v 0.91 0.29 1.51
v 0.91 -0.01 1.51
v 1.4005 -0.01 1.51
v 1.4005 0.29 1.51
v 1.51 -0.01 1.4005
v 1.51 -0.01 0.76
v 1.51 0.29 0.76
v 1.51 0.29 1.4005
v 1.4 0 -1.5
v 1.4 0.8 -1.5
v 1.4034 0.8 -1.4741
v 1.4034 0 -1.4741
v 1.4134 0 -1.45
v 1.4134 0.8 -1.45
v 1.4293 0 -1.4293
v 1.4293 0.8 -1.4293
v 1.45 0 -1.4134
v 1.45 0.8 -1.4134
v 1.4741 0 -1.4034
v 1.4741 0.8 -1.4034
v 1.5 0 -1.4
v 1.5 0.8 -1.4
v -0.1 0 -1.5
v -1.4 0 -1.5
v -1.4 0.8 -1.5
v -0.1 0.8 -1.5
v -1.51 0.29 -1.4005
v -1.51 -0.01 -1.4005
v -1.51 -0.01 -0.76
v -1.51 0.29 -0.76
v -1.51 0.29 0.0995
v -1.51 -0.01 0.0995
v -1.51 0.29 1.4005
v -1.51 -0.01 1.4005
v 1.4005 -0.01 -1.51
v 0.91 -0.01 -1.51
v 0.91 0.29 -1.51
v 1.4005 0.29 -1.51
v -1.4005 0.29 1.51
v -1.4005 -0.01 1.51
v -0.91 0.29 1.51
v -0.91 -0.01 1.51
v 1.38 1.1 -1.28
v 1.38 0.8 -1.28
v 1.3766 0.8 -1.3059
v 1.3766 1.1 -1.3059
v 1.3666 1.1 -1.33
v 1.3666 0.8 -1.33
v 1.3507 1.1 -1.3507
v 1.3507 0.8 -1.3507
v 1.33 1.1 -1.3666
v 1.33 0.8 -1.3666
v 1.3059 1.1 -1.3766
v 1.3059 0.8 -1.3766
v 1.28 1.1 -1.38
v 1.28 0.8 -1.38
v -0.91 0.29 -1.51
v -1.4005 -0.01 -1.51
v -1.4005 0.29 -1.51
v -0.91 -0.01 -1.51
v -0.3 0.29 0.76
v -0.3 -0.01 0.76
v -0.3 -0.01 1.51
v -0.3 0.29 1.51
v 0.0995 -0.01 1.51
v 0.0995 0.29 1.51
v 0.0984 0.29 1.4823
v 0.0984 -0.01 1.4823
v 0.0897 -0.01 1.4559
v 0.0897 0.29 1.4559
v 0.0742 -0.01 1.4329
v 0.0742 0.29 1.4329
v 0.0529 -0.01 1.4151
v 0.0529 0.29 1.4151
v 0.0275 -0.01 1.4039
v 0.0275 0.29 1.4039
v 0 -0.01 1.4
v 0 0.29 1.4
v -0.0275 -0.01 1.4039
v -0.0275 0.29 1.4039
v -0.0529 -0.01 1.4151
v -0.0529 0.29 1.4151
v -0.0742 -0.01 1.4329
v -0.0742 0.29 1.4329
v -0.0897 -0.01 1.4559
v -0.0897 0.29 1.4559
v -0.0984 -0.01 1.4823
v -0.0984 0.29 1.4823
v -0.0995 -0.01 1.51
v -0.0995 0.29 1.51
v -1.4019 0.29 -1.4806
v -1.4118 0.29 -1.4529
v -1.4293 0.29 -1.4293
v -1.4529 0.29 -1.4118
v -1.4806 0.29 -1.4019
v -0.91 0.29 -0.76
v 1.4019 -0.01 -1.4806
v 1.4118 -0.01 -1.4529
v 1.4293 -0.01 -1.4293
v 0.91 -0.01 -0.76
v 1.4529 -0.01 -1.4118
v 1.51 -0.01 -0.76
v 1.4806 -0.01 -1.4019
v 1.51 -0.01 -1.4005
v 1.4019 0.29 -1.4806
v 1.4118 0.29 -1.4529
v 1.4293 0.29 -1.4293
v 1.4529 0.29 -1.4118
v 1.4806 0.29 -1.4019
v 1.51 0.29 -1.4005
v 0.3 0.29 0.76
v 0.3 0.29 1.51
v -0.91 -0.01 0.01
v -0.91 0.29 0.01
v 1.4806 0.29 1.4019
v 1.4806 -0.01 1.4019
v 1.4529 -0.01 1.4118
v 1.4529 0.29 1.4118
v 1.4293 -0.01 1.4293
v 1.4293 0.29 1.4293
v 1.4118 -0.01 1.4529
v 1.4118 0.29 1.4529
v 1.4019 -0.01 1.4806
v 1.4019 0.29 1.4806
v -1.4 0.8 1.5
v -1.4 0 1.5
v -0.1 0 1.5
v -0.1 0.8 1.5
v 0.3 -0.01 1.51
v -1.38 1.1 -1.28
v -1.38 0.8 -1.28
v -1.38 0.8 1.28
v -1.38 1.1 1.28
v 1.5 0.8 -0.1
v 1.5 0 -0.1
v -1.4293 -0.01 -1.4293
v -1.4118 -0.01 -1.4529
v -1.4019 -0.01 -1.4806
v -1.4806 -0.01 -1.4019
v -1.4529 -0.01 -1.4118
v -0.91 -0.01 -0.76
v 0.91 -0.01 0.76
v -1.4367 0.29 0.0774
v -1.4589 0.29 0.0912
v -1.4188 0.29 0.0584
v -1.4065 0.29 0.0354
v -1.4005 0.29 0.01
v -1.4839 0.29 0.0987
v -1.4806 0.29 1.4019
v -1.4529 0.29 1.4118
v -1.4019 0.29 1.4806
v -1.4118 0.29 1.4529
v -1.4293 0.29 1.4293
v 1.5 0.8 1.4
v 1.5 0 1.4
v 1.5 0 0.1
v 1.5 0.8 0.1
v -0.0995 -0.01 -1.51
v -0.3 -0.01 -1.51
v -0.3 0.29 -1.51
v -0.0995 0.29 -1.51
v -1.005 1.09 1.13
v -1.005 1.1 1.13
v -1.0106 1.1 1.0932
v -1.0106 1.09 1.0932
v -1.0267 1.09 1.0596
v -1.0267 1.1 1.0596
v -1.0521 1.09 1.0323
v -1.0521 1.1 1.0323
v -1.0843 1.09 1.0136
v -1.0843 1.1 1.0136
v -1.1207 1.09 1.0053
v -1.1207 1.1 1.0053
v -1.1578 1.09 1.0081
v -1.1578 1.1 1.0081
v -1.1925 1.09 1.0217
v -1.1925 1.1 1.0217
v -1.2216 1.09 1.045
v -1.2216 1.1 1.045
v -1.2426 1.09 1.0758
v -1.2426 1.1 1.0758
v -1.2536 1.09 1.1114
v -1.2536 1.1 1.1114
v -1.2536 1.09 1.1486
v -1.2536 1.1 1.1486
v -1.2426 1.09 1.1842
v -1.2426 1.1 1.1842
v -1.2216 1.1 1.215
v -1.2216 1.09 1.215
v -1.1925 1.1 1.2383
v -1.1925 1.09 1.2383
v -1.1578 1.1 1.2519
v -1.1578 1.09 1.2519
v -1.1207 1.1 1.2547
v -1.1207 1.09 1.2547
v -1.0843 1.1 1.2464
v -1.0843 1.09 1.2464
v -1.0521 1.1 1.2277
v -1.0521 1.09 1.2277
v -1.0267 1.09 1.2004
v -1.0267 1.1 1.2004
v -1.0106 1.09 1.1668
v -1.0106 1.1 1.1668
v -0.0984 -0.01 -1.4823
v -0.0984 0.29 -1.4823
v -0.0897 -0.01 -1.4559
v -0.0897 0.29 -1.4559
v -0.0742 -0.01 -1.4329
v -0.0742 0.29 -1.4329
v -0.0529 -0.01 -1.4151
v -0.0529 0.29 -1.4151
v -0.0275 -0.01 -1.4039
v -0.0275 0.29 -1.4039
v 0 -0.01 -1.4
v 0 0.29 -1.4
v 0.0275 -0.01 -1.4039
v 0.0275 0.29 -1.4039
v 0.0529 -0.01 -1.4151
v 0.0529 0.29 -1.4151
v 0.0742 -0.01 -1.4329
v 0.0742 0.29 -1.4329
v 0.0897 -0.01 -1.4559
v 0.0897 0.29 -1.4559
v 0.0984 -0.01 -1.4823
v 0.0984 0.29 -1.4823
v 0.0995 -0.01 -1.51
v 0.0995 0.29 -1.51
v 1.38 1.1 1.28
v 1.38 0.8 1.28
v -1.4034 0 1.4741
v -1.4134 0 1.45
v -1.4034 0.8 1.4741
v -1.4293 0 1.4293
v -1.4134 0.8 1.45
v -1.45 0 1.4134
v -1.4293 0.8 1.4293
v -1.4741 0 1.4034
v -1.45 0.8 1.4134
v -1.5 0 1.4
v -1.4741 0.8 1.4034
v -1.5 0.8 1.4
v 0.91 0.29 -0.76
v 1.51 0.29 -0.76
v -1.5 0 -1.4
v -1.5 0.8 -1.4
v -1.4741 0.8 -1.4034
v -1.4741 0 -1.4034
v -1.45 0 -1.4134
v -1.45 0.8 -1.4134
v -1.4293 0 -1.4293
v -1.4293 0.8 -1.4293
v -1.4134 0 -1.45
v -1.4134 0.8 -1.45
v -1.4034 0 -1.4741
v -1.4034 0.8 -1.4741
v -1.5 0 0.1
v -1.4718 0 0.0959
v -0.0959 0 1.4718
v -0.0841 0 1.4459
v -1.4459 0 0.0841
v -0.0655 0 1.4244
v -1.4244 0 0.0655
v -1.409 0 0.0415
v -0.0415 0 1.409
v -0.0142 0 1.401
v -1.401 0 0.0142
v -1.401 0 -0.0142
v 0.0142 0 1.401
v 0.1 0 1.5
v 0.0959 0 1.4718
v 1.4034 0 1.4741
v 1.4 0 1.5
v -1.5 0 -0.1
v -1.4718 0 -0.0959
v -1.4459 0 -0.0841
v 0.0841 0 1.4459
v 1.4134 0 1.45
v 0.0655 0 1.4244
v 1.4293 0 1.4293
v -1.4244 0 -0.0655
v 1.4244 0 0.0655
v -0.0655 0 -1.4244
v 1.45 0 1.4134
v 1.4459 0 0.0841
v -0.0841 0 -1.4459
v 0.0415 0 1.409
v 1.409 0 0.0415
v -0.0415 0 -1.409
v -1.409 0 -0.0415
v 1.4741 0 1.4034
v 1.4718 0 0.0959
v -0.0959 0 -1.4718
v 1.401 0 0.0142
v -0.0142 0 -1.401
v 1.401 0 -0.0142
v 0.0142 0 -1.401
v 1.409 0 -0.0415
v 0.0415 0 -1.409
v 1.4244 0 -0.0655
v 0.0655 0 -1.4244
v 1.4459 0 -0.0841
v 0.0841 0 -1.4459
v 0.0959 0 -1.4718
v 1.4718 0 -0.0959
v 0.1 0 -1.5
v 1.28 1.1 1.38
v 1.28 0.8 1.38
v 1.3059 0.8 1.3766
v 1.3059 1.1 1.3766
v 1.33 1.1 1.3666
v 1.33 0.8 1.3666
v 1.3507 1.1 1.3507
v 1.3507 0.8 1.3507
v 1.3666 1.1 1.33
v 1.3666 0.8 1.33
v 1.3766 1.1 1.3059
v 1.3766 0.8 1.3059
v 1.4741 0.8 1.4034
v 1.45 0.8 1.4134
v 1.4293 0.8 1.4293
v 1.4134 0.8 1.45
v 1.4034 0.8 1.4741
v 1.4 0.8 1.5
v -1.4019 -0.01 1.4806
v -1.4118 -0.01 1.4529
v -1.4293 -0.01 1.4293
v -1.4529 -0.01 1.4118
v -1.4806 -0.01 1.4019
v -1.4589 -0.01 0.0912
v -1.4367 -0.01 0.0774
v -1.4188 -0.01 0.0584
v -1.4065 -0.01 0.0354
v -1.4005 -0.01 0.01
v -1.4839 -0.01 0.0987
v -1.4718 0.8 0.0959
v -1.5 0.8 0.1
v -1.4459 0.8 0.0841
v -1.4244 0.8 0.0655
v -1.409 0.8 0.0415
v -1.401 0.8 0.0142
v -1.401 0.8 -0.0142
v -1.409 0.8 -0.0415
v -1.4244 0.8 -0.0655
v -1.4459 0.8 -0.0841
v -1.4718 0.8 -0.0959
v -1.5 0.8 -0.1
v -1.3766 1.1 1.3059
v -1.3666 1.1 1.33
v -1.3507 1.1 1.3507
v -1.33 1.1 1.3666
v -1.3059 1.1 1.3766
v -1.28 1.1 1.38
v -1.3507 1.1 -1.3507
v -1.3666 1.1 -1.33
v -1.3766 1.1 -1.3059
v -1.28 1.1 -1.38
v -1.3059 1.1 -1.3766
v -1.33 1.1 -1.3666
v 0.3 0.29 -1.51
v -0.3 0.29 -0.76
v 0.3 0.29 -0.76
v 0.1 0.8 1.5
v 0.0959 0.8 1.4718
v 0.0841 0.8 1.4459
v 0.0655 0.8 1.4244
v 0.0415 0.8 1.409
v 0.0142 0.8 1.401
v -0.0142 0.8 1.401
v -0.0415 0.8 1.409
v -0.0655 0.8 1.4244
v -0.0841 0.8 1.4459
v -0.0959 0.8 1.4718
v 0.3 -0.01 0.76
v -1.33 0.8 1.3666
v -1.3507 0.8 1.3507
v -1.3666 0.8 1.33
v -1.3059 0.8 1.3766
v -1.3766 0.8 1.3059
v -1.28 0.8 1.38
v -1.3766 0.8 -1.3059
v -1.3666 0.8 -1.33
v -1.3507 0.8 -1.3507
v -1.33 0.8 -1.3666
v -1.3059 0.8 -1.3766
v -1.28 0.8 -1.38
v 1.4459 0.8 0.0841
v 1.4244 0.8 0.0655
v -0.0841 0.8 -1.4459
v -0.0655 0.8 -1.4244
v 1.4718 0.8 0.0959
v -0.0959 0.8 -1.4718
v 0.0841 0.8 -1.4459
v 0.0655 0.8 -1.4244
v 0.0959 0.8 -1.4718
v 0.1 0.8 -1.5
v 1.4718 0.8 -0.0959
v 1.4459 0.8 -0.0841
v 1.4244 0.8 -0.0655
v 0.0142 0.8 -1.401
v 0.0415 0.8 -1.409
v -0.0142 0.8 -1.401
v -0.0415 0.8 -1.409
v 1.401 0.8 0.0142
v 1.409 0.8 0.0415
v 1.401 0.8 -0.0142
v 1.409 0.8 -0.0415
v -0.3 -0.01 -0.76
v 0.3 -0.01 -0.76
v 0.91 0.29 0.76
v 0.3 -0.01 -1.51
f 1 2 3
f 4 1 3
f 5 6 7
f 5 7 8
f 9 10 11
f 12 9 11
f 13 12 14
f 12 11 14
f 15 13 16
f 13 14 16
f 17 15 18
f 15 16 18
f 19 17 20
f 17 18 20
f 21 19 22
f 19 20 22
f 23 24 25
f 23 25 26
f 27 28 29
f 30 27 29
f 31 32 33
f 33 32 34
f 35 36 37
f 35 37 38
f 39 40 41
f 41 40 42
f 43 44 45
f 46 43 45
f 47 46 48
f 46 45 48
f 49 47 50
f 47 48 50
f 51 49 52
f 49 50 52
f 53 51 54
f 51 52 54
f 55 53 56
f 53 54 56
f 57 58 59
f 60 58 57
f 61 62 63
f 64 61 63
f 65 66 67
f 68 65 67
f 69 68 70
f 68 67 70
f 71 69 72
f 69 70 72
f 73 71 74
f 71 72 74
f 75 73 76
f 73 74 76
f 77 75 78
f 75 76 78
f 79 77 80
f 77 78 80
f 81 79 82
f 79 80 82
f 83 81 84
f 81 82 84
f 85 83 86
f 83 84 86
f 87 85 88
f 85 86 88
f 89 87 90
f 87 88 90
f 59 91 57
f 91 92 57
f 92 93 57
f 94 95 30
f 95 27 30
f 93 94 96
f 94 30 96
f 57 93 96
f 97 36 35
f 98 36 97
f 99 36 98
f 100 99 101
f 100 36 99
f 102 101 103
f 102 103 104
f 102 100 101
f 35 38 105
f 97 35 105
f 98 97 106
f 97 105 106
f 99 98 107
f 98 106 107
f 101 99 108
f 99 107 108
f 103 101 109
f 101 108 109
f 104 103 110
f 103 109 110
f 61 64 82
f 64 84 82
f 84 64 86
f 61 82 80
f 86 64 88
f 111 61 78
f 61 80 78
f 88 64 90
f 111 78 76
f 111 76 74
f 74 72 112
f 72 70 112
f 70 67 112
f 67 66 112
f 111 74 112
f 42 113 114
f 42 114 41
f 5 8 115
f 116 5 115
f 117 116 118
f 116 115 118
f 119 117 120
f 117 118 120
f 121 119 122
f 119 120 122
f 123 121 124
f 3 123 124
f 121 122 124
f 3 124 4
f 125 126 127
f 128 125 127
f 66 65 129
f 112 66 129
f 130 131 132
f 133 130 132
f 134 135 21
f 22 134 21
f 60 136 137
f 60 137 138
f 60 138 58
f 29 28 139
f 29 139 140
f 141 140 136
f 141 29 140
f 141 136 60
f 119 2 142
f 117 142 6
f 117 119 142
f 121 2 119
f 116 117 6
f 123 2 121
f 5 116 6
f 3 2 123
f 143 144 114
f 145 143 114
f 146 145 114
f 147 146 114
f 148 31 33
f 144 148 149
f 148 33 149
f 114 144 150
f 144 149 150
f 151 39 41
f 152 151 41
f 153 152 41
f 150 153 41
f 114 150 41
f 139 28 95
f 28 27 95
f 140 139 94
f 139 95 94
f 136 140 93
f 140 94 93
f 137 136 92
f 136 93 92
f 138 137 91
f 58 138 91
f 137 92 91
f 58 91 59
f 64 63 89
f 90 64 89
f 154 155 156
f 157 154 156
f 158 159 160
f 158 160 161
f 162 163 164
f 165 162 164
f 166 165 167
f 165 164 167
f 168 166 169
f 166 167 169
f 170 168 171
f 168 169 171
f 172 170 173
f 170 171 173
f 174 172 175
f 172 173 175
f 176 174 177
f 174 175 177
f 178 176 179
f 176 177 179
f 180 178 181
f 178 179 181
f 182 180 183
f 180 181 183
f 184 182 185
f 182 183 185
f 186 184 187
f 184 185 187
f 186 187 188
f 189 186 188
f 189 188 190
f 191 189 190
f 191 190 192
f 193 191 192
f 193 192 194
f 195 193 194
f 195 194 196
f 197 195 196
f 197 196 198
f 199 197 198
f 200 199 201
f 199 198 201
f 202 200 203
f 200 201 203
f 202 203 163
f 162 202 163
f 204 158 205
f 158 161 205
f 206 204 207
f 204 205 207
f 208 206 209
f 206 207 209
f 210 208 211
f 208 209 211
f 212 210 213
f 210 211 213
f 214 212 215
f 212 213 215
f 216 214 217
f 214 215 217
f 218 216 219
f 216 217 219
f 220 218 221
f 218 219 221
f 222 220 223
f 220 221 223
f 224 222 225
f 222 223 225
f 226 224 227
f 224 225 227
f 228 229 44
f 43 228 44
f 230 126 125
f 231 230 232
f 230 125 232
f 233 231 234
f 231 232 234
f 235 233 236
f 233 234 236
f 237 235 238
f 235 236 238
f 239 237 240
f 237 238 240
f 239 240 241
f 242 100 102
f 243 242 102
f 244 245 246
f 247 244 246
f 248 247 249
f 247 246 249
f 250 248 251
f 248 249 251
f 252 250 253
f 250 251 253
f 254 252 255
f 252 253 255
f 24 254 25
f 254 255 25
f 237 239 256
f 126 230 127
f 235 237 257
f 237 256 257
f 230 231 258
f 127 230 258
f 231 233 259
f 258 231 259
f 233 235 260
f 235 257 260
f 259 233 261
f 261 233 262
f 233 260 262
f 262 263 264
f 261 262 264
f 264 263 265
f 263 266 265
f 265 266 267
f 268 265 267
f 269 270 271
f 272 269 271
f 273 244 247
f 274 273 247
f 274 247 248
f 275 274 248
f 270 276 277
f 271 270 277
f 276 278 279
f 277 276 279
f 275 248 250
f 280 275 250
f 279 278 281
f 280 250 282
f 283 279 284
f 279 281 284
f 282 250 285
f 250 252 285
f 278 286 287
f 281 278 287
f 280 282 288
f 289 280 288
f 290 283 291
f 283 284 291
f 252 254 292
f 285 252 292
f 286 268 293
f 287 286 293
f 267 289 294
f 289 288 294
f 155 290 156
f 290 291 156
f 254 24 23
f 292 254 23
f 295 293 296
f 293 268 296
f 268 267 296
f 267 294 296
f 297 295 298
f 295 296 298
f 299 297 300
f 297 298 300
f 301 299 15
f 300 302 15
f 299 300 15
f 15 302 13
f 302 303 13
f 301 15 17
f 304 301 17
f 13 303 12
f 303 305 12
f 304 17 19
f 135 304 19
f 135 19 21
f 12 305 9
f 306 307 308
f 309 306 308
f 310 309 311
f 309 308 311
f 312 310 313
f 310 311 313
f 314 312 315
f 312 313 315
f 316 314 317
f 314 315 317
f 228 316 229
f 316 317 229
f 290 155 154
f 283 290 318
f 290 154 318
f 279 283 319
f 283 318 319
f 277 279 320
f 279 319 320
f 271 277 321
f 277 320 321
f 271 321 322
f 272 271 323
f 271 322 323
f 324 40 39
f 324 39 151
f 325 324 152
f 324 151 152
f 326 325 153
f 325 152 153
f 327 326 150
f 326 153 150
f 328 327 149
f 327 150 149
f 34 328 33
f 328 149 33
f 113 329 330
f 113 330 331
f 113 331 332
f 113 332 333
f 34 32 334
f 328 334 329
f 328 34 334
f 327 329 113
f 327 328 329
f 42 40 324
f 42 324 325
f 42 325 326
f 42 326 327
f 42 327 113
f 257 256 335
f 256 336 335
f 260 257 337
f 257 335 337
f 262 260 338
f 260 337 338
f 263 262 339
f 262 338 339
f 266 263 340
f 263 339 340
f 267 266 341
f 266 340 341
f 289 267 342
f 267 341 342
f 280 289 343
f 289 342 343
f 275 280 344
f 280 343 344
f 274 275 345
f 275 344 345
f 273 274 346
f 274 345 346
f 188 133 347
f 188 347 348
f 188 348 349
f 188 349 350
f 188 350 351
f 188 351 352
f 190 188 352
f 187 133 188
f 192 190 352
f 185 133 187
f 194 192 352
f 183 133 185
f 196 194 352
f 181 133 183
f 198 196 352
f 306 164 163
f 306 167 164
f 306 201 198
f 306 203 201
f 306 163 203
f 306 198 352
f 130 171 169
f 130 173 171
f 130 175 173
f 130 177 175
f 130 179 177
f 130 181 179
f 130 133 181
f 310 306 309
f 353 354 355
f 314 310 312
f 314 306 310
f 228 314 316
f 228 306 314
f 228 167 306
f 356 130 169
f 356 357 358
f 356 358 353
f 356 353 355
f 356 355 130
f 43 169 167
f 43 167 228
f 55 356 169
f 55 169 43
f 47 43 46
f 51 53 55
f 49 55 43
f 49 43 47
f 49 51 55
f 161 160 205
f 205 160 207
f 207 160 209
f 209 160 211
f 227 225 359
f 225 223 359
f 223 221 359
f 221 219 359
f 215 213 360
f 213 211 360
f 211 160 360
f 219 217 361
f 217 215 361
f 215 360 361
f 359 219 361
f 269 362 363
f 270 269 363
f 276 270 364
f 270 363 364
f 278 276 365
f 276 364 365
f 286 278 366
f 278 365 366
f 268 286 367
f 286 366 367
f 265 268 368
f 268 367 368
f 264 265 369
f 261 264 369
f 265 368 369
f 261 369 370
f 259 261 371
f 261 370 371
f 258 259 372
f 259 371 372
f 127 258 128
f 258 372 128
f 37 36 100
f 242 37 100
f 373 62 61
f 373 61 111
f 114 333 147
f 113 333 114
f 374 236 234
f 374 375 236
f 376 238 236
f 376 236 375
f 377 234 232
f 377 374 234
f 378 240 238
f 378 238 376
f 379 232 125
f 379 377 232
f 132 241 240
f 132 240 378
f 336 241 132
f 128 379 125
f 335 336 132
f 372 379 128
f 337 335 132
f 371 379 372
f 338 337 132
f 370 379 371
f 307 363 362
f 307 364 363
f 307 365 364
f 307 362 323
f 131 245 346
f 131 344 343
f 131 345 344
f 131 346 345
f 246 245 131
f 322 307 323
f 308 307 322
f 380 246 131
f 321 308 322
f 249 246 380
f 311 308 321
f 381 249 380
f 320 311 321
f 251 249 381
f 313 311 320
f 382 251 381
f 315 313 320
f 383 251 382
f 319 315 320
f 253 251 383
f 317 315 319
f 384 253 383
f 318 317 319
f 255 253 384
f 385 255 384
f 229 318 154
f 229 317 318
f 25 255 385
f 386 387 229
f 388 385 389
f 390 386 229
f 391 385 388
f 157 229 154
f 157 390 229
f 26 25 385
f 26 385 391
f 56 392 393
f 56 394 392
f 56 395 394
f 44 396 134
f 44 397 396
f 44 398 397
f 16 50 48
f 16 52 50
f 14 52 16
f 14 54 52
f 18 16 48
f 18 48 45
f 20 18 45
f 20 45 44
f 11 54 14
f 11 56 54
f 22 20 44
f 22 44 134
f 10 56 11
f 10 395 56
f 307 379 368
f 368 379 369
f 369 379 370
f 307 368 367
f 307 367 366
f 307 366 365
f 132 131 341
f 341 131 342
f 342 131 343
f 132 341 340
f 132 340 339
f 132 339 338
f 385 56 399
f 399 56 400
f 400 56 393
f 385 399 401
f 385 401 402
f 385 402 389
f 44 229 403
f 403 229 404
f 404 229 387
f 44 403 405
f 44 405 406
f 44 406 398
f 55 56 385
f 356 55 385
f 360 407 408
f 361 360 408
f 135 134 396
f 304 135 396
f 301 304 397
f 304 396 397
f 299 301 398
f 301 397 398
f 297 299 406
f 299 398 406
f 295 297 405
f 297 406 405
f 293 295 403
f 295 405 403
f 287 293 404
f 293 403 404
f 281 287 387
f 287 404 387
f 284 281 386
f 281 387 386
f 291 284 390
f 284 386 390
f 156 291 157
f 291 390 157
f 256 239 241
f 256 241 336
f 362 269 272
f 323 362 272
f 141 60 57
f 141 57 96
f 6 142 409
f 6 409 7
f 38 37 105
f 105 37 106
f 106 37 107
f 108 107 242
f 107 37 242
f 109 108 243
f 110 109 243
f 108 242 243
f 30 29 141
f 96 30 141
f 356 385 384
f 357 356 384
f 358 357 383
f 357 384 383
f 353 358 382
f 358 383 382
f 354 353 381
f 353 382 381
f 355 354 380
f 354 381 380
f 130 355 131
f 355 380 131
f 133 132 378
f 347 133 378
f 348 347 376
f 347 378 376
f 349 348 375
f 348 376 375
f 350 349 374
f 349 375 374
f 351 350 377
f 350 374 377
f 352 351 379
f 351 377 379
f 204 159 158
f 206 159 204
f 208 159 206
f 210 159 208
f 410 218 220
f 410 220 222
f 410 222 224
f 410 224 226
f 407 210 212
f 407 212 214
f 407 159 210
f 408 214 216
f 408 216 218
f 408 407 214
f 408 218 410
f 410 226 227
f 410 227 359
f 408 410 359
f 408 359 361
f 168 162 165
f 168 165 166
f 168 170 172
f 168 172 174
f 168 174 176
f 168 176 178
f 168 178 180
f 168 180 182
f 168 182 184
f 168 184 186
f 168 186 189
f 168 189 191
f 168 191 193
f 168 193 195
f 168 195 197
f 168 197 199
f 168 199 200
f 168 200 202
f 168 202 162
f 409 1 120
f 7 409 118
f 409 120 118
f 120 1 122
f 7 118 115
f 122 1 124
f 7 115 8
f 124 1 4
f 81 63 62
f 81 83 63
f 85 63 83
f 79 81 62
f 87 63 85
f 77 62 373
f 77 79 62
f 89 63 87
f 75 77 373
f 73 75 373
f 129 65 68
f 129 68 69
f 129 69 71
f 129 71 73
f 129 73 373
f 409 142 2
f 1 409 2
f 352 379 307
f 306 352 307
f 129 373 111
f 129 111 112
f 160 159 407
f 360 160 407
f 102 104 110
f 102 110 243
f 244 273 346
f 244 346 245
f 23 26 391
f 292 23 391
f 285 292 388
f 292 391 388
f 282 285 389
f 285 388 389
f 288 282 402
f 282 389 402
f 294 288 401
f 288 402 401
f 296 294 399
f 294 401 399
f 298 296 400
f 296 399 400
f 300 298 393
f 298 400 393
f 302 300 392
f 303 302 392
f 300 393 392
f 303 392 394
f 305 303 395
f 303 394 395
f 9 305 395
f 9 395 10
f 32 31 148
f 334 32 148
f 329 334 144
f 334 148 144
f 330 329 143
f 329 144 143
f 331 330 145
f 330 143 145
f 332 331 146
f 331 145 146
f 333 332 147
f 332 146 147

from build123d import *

# Parameters (mm, degrees)
SKETCH2_W             = 3
SKETCH2_H             = 3
BOSS_EXTRUDE1_DEPTH   = 0.8
BOSS_EXTRUDE2_DEPTH   = 0.3
BOSS_EXTRUDE3_START   = 0.01
SKETCH5_W             = 0.6
SKETCH5_H             = 0.75
BOSS_EXTRUDE3_DEPTH   = 0.3
SKETCH5_H_2           = 1.5
BOSS_EXTRUDE3_2_DEPTH = 0.3
BOSS_EXTRUDE3_3_DEPTH = 0.3
BOSS_EXTRUDE3_4_DEPTH = 0.3
BOSS_EXTRUDE3_5_DEPTH = 0.3
BOSS_EXTRUDE3_6_DEPTH = 0.3
SKETCH3_R             = 0.1
CUT_EXTRUDE1_DEPTH    = 1.81
SKETCH6_R             = 0.125
CUT_EXTRUDE2_DEPTH    = 0.01


with BuildPart() as part:
    # Sketch2 → Boss-Extrude1 (new body)
    with BuildSketch(Plane(origin=(0, 0, 0), x_dir=(1, 0, 0), z_dir=(0, 1, 0))):
        Rectangle(SKETCH2_W, SKETCH2_H)
    extrude(amount=BOSS_EXTRUDE1_DEPTH)

    # Sketch4 → Boss-Extrude2 (add)
    with BuildSketch(Plane(origin=(0, 0.8, 0), x_dir=(1, 0, 0), z_dir=(0, 1, 0))):
        with BuildLine():
            Line((-1.28, -1.38), (1.28, -1.38))
            ThreePointArc((1.28, -1.38), (1.350710678, -1.350710678), (1.38, -1.28))
            Line((1.38, -1.28), (1.38, 1.28))
            ThreePointArc((1.38, 1.28), (1.350710678, 1.350710678), (1.28, 1.38))
            Line((1.28, 1.38), (-1.28, 1.38))
            ThreePointArc((-1.28, 1.38), (-1.350710678, 1.350710678), (-1.38, 1.28))
            Line((-1.38, 1.28), (-1.38, -1.28))
            ThreePointArc((-1.38, -1.28), (-1.350710678, -1.350710678), (-1.28, -1.38))
        make_face()
    extrude(amount=BOSS_EXTRUDE2_DEPTH)


with BuildPart() as body_2:
    # Sketch5 → Boss-Extrude3 (new body)
    with BuildSketch(Plane.XZ.offset(BOSS_EXTRUDE3_START)):
        with Locations((-1.21, -1.135)):
            Rectangle(SKETCH5_W, SKETCH5_H)
    extrude(amount=-BOSS_EXTRUDE3_DEPTH)


with BuildPart() as body_3:
    # Sketch5 → Boss-Extrude3 2 (new body)
    with BuildSketch(Plane.XZ.offset(BOSS_EXTRUDE3_START)):
        with Locations((-1.21, 0.76)):
            Rectangle(SKETCH5_W, SKETCH5_H_2)
    extrude(amount=-BOSS_EXTRUDE3_2_DEPTH)


with BuildPart() as body_4:
    # Sketch5 → Boss-Extrude3 3 (new body)
    with BuildSketch(Plane.XZ.offset(BOSS_EXTRUDE3_START)):
        with Locations((0, -1.135)):
            Rectangle(SKETCH5_W, SKETCH5_H)
    extrude(amount=-BOSS_EXTRUDE3_3_DEPTH)


with BuildPart() as body_5:
    # Sketch5 → Boss-Extrude3 4 (new body)
    with BuildSketch(Plane.XZ.offset(BOSS_EXTRUDE3_START)):
        with Locations((1.21, -1.135)):
            Rectangle(SKETCH5_W, SKETCH5_H)
    extrude(amount=-BOSS_EXTRUDE3_4_DEPTH)


with BuildPart() as body_6:
    # Sketch5 → Boss-Extrude3 5 (new body)
    with BuildSketch(Plane.XZ.offset(BOSS_EXTRUDE3_START)):
        with Locations((1.21, 1.135)):
            Rectangle(SKETCH5_W, SKETCH5_H)
    extrude(amount=-BOSS_EXTRUDE3_5_DEPTH)


with BuildPart() as body_7:
    # Sketch5 → Boss-Extrude3 6 (new body)
    with BuildSketch(Plane.XZ.offset(BOSS_EXTRUDE3_START)):
        with Locations((0, 1.135)):
            Rectangle(SKETCH5_W, SKETCH5_H)
    extrude(amount=-BOSS_EXTRUDE3_6_DEPTH)


with BuildPart() as cut_extrude1_tool:
    # Sketch3 → Cut-Extrude1 (new body, through all)
    with BuildSketch(Plane(origin=(0, 0.8, 0), x_dir=(1, 0, 0), z_dir=(0, 1, 0))):
        with Locations((-1.5, 1.5)):
            Circle(SKETCH3_R)
        with Locations((0, 1.5)):
            Circle(SKETCH3_R)
        with Locations((1.5, 1.5)):
            Circle(SKETCH3_R)
        with Locations((-1.5, 0)):
            Circle(SKETCH3_R)
        with Locations((1.5, 0)):
            Circle(SKETCH3_R)
        with Locations((1.5, -1.5)):
            Circle(SKETCH3_R)
        with Locations((0, -1.5)):
            Circle(SKETCH3_R)
        with Locations((-1.5, -1.5)):
            Circle(SKETCH3_R)
    extrude(amount=-CUT_EXTRUDE1_DEPTH)


with BuildPart() as part_1:
    add(part.part)

    # Cut-Extrude1: cut by cut_extrude1_tool
    add(cut_extrude1_tool.part, mode=Mode.SUBTRACT)

    # Sketch6 → Cut-Extrude2 (cut)
    with BuildSketch(Plane(origin=(0, 1.1, 0), x_dir=(1, 0, 0), z_dir=(0, 1, 0))):
        with Locations((-1.13, -1.13)):
            Circle(SKETCH6_R)
    extrude(amount=-CUT_EXTRUDE2_DEPTH, mode=Mode.SUBTRACT)


with BuildPart() as body_2_1:
    add(body_2.part)

    # Cut-Extrude1: cut by cut_extrude1_tool
    add(cut_extrude1_tool.part, mode=Mode.SUBTRACT)


with BuildPart() as body_3_1:
    add(body_3.part)

    # Cut-Extrude1: cut by cut_extrude1_tool
    add(cut_extrude1_tool.part, mode=Mode.SUBTRACT)


with BuildPart() as body_4_1:
    add(body_4.part)

    # Cut-Extrude1: cut by cut_extrude1_tool
    add(cut_extrude1_tool.part, mode=Mode.SUBTRACT)


with BuildPart() as body_5_1:
    add(body_5.part)

    # Cut-Extrude1: cut by cut_extrude1_tool
    add(cut_extrude1_tool.part, mode=Mode.SUBTRACT)


with BuildPart() as body_6_1:
    add(body_6.part)

    # Cut-Extrude1: cut by cut_extrude1_tool
    add(cut_extrude1_tool.part, mode=Mode.SUBTRACT)


with BuildPart() as body_7_1:
    add(body_7.part)

    # Cut-Extrude1: cut by cut_extrude1_tool
    add(cut_extrude1_tool.part, mode=Mode.SUBTRACT)


solid = Compound([part_1.part, body_2_1.part, body_3_1.part, body_4_1.part, body_5_1.part, body_6_1.part, body_7_1.part])
